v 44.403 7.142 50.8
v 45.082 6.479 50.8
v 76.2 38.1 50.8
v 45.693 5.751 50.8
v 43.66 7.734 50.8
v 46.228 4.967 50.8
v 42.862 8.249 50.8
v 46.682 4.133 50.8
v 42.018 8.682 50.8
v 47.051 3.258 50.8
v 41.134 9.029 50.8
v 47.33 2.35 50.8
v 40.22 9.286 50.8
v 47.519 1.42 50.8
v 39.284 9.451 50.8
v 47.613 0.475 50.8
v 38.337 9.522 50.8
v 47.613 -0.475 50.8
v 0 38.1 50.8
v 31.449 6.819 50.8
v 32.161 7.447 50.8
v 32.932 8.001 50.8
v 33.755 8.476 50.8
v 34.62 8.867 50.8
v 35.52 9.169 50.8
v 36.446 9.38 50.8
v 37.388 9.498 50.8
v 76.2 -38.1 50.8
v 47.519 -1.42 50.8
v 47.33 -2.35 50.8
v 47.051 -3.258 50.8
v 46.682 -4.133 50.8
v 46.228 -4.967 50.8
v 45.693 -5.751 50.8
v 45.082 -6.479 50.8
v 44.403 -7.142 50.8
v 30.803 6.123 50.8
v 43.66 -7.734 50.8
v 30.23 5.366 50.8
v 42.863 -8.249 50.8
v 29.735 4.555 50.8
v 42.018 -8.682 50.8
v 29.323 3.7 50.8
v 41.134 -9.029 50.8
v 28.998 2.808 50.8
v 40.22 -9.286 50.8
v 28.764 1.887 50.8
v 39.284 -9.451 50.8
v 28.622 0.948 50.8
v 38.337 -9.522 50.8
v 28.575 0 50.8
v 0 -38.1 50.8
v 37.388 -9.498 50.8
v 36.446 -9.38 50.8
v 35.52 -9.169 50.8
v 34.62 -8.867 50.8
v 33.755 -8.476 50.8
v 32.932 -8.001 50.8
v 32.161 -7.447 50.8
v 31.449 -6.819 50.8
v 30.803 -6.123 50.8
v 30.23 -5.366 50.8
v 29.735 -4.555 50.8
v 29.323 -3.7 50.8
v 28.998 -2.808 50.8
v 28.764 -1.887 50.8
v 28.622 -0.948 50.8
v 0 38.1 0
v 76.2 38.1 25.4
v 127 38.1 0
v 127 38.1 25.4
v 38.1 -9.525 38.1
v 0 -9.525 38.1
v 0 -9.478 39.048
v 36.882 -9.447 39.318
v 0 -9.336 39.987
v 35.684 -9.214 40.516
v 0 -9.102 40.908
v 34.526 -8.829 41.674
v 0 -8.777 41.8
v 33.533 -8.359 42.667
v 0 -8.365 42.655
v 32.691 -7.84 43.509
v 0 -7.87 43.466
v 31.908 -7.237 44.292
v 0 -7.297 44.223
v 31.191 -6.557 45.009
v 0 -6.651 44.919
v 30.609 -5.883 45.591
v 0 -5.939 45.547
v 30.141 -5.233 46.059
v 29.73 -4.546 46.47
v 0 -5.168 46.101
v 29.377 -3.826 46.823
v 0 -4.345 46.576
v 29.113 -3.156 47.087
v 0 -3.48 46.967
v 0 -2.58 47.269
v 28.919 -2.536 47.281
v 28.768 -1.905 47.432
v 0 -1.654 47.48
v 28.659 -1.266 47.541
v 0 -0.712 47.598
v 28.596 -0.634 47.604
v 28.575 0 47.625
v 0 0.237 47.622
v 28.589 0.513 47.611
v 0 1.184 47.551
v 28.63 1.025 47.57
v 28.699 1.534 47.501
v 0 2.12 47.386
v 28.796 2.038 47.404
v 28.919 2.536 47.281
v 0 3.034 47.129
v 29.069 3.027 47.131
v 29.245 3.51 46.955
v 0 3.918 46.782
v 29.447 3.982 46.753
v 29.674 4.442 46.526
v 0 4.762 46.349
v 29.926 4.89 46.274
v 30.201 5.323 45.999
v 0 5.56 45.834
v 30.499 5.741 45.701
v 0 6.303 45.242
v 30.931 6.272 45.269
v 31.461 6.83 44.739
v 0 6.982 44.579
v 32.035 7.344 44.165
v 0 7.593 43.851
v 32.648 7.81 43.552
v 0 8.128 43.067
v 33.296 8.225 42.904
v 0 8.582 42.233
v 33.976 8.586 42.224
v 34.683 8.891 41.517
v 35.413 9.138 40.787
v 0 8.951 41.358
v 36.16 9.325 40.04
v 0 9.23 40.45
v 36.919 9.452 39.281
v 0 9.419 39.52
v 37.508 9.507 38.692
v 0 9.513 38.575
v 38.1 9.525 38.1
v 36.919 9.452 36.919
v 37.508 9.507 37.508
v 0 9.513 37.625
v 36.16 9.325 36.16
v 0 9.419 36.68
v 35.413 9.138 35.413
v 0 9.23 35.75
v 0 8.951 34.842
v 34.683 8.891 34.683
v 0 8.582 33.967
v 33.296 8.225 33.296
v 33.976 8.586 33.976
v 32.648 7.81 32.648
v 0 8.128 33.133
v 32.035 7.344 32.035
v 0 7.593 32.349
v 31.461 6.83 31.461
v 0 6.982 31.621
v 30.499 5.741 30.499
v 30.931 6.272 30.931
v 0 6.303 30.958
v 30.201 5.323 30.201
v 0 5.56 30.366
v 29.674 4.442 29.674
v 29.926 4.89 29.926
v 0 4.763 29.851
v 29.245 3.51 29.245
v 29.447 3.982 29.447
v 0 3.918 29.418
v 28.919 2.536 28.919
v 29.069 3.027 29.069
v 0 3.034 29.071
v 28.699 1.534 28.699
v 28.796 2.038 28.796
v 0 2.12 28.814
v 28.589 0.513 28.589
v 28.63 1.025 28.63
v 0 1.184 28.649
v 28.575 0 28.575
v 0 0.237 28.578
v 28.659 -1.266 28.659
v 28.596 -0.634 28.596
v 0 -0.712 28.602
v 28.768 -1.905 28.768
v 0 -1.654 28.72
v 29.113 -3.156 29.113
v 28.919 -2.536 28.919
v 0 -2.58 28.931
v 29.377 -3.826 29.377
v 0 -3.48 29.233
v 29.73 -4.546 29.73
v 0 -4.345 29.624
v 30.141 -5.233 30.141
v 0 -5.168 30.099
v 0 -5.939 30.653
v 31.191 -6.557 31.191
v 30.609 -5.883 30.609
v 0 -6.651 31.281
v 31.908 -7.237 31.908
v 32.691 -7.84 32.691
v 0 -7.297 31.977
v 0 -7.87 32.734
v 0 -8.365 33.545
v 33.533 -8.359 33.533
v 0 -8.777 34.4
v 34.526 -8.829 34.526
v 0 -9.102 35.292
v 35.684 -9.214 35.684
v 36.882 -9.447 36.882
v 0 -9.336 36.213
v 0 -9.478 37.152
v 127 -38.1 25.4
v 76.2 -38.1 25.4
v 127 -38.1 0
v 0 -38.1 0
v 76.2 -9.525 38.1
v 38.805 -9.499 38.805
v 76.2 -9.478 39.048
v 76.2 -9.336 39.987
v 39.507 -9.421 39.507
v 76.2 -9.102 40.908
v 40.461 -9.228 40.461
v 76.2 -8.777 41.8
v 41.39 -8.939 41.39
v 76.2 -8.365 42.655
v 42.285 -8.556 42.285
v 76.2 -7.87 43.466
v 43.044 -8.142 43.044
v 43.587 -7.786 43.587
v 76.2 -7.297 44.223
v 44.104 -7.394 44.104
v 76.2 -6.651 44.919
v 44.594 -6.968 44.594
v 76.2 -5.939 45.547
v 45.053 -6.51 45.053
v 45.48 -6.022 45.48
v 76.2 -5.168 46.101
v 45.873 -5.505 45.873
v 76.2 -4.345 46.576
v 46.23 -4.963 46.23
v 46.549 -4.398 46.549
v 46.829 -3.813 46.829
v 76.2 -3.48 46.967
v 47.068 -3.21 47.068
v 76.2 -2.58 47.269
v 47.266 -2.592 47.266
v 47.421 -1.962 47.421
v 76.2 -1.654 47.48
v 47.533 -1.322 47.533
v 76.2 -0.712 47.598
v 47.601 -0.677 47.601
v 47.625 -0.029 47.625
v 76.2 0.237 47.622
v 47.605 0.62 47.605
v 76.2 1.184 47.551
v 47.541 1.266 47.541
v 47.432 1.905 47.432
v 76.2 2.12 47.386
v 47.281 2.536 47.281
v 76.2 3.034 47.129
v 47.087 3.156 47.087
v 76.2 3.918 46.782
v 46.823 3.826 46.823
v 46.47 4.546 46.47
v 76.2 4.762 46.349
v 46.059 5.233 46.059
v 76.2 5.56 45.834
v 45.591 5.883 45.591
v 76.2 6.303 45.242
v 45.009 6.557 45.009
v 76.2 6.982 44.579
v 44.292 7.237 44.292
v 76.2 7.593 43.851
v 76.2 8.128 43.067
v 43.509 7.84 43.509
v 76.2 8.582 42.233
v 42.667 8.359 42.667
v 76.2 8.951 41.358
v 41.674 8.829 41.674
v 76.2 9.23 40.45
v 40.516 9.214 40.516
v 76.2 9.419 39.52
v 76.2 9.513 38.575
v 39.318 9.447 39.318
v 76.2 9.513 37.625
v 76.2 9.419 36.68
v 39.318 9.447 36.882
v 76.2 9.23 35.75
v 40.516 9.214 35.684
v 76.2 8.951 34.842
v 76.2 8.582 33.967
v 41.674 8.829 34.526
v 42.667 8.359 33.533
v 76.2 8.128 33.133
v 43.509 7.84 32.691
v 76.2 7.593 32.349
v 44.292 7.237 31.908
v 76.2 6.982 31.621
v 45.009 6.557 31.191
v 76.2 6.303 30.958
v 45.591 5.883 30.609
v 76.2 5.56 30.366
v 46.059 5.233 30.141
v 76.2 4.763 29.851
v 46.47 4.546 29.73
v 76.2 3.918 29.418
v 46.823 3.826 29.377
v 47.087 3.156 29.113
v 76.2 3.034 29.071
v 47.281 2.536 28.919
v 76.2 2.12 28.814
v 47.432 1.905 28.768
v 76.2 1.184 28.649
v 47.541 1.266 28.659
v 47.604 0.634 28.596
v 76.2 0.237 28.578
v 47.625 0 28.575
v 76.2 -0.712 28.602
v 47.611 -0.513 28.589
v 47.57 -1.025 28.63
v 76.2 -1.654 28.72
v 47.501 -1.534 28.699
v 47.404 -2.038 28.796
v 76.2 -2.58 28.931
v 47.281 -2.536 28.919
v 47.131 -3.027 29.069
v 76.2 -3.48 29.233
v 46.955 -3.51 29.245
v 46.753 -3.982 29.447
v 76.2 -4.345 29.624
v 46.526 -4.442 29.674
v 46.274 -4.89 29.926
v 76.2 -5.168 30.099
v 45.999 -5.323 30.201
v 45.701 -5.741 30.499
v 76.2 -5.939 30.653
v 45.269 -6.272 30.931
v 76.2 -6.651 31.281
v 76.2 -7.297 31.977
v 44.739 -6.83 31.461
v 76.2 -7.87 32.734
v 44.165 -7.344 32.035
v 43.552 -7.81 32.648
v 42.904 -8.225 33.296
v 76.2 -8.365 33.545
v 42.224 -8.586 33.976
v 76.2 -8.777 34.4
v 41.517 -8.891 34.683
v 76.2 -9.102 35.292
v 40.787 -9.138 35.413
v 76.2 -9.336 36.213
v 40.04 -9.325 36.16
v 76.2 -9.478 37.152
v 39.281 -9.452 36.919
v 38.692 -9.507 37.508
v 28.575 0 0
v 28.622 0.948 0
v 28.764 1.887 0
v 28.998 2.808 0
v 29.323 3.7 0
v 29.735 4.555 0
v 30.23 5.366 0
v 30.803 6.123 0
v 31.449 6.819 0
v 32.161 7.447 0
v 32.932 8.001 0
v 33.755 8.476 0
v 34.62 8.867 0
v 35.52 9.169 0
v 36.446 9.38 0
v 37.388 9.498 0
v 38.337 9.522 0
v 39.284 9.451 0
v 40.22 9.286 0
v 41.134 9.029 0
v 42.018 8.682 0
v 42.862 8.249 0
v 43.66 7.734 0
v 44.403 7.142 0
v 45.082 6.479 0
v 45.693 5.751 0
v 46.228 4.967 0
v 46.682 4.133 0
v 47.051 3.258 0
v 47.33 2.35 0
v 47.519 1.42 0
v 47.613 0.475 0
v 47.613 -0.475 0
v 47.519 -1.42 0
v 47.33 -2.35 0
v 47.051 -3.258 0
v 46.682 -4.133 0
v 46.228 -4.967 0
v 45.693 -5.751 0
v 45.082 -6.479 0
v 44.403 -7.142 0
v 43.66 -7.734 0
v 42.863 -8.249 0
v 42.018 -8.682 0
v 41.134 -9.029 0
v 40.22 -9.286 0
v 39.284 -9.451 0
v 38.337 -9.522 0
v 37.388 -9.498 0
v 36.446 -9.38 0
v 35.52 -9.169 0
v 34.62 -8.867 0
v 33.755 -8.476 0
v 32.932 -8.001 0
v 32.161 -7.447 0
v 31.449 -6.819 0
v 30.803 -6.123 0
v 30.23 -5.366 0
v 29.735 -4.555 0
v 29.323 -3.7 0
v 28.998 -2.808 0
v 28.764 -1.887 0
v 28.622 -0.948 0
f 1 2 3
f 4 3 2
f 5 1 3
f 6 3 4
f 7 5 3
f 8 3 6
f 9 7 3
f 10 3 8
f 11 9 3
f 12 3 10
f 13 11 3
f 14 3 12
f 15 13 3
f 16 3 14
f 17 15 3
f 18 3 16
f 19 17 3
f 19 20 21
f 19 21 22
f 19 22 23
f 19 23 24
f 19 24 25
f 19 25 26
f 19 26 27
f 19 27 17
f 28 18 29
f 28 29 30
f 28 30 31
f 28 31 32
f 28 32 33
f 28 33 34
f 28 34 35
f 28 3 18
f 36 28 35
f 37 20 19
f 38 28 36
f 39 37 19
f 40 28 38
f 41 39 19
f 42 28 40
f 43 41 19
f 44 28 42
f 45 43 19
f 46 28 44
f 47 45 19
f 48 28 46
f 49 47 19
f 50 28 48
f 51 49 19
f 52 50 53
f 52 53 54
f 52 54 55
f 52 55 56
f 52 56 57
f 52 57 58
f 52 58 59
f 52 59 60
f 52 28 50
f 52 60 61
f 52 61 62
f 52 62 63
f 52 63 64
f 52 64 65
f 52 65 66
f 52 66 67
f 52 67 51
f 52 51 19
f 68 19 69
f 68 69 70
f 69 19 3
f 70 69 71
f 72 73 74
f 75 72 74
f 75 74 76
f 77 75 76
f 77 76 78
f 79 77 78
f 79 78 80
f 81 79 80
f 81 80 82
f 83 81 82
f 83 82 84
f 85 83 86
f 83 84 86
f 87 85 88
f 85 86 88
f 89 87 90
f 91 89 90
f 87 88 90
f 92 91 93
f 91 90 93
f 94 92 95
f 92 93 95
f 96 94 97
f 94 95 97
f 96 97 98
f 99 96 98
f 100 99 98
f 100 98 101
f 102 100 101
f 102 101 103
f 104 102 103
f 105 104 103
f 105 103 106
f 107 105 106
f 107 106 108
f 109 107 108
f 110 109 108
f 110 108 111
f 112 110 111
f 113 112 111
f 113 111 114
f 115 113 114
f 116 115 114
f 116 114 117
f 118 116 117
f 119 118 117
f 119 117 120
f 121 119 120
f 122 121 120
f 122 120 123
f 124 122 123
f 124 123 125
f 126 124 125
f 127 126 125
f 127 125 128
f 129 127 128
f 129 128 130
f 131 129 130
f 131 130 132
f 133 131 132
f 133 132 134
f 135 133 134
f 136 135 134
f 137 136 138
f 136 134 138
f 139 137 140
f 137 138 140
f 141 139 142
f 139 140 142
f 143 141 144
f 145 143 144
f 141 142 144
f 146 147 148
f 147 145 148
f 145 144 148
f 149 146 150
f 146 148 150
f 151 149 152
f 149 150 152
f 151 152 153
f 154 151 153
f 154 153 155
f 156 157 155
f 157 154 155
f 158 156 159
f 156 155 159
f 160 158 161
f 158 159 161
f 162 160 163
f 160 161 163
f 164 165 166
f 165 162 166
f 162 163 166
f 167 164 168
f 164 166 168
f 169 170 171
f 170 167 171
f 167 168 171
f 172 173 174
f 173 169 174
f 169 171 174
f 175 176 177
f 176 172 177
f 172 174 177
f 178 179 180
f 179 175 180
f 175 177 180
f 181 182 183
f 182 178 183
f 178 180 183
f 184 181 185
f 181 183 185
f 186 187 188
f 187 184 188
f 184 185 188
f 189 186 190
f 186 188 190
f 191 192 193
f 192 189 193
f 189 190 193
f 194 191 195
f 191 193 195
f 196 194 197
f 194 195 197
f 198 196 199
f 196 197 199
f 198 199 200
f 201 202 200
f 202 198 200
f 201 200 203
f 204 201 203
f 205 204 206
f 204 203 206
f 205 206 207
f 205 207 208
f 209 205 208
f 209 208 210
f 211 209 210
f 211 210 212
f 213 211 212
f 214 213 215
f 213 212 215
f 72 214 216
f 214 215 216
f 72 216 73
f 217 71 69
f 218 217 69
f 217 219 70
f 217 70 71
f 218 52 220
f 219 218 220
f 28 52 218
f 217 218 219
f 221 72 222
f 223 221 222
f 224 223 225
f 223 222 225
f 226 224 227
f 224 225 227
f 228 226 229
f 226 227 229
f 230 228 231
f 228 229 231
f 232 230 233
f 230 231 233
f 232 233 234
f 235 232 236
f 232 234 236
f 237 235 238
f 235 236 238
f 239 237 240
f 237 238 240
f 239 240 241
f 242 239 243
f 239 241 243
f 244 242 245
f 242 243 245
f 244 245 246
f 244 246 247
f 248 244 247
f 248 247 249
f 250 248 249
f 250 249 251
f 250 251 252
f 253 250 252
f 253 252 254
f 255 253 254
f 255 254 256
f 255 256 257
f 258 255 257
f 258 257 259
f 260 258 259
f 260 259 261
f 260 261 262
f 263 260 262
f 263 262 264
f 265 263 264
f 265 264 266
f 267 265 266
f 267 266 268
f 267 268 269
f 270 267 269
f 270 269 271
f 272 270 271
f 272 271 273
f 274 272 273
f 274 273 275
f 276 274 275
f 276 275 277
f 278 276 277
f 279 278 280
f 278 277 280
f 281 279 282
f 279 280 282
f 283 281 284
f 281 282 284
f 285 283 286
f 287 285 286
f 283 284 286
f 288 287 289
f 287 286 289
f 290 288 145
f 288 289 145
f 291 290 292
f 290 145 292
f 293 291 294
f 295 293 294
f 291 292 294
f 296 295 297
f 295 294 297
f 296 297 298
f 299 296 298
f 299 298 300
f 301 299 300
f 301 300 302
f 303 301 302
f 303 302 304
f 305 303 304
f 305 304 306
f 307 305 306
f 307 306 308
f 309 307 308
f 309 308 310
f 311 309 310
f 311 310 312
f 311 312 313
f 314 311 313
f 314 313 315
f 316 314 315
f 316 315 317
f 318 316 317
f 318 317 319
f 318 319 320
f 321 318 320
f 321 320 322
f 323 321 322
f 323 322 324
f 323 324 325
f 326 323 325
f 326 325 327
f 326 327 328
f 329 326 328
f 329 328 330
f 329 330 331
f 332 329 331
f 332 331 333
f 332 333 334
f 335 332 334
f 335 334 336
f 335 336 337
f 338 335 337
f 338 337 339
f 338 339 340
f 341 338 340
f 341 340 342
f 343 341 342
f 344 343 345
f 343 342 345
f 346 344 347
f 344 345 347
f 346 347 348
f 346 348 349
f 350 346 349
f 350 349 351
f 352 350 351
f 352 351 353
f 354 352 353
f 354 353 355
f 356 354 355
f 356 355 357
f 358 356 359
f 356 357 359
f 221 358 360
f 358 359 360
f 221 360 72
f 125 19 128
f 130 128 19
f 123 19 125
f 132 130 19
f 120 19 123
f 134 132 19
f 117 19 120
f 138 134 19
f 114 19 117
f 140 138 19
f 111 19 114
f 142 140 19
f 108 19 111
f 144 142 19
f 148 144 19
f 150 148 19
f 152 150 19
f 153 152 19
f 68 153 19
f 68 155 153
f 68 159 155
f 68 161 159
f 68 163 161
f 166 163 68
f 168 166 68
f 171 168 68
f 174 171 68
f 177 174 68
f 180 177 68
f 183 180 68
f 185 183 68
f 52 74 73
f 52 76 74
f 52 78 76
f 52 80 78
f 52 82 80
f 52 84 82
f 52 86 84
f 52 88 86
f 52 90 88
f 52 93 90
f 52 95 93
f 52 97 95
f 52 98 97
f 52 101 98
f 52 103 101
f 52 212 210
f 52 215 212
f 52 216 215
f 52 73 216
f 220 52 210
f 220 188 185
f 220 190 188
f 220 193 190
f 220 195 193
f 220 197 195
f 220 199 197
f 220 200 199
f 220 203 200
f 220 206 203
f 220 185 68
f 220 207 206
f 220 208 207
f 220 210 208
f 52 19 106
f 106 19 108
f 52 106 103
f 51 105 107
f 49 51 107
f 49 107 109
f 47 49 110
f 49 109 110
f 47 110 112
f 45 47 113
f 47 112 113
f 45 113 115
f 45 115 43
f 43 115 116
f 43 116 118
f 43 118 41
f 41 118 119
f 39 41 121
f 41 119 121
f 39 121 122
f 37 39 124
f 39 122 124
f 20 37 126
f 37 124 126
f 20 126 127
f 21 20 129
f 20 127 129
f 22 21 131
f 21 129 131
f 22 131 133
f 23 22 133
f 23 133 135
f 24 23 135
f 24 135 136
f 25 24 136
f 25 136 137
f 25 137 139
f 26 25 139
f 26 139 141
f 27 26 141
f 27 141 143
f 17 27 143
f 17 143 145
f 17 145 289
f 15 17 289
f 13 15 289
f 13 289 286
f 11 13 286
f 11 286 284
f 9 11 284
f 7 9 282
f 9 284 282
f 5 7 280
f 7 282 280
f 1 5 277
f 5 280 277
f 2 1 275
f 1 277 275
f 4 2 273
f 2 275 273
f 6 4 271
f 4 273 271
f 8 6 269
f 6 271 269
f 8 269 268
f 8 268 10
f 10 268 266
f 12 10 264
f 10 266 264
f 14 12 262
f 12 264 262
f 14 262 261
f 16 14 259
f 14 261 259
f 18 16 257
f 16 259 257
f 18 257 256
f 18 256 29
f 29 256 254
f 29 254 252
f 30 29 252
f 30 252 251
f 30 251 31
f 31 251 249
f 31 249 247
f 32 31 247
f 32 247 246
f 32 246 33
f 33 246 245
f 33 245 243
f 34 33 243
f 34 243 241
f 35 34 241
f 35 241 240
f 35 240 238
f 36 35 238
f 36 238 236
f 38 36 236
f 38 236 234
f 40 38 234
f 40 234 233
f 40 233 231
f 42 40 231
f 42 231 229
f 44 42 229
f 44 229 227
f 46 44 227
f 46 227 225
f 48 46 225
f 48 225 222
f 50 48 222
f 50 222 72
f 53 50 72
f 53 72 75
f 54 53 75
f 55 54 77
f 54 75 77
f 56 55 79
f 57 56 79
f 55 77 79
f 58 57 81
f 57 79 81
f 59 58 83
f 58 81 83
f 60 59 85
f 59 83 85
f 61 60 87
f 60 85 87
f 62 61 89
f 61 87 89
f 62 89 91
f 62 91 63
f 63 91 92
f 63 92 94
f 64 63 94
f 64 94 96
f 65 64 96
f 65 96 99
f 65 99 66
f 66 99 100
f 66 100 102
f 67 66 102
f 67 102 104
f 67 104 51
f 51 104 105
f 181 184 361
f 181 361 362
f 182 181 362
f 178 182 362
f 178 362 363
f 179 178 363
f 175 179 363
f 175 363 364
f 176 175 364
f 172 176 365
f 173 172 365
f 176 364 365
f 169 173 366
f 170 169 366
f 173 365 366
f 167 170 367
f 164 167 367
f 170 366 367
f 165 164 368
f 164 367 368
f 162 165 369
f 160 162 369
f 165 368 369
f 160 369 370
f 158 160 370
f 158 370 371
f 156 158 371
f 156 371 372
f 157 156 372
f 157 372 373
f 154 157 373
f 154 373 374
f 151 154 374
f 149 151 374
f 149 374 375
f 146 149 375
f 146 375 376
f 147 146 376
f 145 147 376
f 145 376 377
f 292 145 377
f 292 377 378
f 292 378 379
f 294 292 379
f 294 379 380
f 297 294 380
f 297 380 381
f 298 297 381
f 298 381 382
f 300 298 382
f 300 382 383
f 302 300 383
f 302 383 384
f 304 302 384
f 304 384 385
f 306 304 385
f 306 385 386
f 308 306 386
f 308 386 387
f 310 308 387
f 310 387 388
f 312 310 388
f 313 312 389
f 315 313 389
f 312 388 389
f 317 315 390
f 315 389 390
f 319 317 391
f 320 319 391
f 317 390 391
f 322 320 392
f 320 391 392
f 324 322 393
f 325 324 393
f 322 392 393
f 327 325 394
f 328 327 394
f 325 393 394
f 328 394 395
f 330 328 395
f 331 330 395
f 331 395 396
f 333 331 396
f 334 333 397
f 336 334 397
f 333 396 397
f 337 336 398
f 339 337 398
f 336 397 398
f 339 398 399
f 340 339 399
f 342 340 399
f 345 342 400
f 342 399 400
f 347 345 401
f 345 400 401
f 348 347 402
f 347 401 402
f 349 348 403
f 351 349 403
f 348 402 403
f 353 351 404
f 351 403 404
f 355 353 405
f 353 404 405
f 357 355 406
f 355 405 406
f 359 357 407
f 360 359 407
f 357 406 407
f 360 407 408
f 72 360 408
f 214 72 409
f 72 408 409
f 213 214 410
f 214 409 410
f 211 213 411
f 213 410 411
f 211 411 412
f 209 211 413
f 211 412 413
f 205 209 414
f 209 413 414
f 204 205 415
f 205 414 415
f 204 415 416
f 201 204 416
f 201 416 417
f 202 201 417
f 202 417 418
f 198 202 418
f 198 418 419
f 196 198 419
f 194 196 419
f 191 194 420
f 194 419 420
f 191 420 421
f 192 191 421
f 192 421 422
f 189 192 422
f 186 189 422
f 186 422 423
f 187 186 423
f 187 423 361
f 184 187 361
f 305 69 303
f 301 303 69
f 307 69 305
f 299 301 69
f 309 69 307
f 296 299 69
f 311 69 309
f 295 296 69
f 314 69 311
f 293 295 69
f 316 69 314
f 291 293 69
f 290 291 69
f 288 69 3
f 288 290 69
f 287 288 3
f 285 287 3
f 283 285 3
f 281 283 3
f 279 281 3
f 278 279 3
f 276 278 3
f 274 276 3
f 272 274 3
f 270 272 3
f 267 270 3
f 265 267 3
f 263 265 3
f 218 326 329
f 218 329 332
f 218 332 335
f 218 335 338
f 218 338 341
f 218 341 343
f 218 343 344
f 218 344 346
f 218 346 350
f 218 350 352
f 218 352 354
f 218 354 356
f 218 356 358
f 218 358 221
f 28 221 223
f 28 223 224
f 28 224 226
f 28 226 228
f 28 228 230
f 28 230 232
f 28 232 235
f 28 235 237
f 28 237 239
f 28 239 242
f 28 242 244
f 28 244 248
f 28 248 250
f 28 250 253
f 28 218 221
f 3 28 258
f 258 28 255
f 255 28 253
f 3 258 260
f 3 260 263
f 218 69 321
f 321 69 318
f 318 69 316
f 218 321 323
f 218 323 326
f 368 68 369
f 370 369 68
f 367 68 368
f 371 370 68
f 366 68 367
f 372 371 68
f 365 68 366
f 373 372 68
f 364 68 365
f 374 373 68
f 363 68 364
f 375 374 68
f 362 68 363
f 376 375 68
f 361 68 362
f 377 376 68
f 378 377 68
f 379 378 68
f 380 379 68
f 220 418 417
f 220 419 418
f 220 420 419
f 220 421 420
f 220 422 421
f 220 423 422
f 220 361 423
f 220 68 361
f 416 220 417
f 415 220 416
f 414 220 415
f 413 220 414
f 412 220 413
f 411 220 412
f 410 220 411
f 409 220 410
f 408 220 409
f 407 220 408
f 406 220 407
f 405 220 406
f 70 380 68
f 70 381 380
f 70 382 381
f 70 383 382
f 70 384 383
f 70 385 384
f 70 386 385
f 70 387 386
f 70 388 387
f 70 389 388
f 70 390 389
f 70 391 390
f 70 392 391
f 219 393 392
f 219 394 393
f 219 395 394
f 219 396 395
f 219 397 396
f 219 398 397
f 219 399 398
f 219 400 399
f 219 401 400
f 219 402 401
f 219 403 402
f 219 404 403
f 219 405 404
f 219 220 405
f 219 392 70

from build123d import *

# Parameters (mm, degrees)
F1_DEPTH = 38.1
F3_D     = 19.05
F5_D     = 19.05


with BuildPart() as f1:
    # F0 (on Front) → F1 (new body, symmetric)
    with BuildSketch(Plane.XZ):
        Polygon((0, 50.8), (0, 0), (127, 0), (127, 25.4), (76.2, 25.4), (76.2, 50.8), align=None)
    extrude(amount=F1_DEPTH, both=True)

    # F3 (through all)
    with Locations(Plane.XY.offset(50.8)):
        with Locations((38.1, 0)):
            Hole(F3_D / 2)

    # F5 (through all)
    with Locations(Plane.YZ.offset(76.2)):
        with Locations((0, 38.1)):
            Hole(F5_D / 2)


solid = f1.part
